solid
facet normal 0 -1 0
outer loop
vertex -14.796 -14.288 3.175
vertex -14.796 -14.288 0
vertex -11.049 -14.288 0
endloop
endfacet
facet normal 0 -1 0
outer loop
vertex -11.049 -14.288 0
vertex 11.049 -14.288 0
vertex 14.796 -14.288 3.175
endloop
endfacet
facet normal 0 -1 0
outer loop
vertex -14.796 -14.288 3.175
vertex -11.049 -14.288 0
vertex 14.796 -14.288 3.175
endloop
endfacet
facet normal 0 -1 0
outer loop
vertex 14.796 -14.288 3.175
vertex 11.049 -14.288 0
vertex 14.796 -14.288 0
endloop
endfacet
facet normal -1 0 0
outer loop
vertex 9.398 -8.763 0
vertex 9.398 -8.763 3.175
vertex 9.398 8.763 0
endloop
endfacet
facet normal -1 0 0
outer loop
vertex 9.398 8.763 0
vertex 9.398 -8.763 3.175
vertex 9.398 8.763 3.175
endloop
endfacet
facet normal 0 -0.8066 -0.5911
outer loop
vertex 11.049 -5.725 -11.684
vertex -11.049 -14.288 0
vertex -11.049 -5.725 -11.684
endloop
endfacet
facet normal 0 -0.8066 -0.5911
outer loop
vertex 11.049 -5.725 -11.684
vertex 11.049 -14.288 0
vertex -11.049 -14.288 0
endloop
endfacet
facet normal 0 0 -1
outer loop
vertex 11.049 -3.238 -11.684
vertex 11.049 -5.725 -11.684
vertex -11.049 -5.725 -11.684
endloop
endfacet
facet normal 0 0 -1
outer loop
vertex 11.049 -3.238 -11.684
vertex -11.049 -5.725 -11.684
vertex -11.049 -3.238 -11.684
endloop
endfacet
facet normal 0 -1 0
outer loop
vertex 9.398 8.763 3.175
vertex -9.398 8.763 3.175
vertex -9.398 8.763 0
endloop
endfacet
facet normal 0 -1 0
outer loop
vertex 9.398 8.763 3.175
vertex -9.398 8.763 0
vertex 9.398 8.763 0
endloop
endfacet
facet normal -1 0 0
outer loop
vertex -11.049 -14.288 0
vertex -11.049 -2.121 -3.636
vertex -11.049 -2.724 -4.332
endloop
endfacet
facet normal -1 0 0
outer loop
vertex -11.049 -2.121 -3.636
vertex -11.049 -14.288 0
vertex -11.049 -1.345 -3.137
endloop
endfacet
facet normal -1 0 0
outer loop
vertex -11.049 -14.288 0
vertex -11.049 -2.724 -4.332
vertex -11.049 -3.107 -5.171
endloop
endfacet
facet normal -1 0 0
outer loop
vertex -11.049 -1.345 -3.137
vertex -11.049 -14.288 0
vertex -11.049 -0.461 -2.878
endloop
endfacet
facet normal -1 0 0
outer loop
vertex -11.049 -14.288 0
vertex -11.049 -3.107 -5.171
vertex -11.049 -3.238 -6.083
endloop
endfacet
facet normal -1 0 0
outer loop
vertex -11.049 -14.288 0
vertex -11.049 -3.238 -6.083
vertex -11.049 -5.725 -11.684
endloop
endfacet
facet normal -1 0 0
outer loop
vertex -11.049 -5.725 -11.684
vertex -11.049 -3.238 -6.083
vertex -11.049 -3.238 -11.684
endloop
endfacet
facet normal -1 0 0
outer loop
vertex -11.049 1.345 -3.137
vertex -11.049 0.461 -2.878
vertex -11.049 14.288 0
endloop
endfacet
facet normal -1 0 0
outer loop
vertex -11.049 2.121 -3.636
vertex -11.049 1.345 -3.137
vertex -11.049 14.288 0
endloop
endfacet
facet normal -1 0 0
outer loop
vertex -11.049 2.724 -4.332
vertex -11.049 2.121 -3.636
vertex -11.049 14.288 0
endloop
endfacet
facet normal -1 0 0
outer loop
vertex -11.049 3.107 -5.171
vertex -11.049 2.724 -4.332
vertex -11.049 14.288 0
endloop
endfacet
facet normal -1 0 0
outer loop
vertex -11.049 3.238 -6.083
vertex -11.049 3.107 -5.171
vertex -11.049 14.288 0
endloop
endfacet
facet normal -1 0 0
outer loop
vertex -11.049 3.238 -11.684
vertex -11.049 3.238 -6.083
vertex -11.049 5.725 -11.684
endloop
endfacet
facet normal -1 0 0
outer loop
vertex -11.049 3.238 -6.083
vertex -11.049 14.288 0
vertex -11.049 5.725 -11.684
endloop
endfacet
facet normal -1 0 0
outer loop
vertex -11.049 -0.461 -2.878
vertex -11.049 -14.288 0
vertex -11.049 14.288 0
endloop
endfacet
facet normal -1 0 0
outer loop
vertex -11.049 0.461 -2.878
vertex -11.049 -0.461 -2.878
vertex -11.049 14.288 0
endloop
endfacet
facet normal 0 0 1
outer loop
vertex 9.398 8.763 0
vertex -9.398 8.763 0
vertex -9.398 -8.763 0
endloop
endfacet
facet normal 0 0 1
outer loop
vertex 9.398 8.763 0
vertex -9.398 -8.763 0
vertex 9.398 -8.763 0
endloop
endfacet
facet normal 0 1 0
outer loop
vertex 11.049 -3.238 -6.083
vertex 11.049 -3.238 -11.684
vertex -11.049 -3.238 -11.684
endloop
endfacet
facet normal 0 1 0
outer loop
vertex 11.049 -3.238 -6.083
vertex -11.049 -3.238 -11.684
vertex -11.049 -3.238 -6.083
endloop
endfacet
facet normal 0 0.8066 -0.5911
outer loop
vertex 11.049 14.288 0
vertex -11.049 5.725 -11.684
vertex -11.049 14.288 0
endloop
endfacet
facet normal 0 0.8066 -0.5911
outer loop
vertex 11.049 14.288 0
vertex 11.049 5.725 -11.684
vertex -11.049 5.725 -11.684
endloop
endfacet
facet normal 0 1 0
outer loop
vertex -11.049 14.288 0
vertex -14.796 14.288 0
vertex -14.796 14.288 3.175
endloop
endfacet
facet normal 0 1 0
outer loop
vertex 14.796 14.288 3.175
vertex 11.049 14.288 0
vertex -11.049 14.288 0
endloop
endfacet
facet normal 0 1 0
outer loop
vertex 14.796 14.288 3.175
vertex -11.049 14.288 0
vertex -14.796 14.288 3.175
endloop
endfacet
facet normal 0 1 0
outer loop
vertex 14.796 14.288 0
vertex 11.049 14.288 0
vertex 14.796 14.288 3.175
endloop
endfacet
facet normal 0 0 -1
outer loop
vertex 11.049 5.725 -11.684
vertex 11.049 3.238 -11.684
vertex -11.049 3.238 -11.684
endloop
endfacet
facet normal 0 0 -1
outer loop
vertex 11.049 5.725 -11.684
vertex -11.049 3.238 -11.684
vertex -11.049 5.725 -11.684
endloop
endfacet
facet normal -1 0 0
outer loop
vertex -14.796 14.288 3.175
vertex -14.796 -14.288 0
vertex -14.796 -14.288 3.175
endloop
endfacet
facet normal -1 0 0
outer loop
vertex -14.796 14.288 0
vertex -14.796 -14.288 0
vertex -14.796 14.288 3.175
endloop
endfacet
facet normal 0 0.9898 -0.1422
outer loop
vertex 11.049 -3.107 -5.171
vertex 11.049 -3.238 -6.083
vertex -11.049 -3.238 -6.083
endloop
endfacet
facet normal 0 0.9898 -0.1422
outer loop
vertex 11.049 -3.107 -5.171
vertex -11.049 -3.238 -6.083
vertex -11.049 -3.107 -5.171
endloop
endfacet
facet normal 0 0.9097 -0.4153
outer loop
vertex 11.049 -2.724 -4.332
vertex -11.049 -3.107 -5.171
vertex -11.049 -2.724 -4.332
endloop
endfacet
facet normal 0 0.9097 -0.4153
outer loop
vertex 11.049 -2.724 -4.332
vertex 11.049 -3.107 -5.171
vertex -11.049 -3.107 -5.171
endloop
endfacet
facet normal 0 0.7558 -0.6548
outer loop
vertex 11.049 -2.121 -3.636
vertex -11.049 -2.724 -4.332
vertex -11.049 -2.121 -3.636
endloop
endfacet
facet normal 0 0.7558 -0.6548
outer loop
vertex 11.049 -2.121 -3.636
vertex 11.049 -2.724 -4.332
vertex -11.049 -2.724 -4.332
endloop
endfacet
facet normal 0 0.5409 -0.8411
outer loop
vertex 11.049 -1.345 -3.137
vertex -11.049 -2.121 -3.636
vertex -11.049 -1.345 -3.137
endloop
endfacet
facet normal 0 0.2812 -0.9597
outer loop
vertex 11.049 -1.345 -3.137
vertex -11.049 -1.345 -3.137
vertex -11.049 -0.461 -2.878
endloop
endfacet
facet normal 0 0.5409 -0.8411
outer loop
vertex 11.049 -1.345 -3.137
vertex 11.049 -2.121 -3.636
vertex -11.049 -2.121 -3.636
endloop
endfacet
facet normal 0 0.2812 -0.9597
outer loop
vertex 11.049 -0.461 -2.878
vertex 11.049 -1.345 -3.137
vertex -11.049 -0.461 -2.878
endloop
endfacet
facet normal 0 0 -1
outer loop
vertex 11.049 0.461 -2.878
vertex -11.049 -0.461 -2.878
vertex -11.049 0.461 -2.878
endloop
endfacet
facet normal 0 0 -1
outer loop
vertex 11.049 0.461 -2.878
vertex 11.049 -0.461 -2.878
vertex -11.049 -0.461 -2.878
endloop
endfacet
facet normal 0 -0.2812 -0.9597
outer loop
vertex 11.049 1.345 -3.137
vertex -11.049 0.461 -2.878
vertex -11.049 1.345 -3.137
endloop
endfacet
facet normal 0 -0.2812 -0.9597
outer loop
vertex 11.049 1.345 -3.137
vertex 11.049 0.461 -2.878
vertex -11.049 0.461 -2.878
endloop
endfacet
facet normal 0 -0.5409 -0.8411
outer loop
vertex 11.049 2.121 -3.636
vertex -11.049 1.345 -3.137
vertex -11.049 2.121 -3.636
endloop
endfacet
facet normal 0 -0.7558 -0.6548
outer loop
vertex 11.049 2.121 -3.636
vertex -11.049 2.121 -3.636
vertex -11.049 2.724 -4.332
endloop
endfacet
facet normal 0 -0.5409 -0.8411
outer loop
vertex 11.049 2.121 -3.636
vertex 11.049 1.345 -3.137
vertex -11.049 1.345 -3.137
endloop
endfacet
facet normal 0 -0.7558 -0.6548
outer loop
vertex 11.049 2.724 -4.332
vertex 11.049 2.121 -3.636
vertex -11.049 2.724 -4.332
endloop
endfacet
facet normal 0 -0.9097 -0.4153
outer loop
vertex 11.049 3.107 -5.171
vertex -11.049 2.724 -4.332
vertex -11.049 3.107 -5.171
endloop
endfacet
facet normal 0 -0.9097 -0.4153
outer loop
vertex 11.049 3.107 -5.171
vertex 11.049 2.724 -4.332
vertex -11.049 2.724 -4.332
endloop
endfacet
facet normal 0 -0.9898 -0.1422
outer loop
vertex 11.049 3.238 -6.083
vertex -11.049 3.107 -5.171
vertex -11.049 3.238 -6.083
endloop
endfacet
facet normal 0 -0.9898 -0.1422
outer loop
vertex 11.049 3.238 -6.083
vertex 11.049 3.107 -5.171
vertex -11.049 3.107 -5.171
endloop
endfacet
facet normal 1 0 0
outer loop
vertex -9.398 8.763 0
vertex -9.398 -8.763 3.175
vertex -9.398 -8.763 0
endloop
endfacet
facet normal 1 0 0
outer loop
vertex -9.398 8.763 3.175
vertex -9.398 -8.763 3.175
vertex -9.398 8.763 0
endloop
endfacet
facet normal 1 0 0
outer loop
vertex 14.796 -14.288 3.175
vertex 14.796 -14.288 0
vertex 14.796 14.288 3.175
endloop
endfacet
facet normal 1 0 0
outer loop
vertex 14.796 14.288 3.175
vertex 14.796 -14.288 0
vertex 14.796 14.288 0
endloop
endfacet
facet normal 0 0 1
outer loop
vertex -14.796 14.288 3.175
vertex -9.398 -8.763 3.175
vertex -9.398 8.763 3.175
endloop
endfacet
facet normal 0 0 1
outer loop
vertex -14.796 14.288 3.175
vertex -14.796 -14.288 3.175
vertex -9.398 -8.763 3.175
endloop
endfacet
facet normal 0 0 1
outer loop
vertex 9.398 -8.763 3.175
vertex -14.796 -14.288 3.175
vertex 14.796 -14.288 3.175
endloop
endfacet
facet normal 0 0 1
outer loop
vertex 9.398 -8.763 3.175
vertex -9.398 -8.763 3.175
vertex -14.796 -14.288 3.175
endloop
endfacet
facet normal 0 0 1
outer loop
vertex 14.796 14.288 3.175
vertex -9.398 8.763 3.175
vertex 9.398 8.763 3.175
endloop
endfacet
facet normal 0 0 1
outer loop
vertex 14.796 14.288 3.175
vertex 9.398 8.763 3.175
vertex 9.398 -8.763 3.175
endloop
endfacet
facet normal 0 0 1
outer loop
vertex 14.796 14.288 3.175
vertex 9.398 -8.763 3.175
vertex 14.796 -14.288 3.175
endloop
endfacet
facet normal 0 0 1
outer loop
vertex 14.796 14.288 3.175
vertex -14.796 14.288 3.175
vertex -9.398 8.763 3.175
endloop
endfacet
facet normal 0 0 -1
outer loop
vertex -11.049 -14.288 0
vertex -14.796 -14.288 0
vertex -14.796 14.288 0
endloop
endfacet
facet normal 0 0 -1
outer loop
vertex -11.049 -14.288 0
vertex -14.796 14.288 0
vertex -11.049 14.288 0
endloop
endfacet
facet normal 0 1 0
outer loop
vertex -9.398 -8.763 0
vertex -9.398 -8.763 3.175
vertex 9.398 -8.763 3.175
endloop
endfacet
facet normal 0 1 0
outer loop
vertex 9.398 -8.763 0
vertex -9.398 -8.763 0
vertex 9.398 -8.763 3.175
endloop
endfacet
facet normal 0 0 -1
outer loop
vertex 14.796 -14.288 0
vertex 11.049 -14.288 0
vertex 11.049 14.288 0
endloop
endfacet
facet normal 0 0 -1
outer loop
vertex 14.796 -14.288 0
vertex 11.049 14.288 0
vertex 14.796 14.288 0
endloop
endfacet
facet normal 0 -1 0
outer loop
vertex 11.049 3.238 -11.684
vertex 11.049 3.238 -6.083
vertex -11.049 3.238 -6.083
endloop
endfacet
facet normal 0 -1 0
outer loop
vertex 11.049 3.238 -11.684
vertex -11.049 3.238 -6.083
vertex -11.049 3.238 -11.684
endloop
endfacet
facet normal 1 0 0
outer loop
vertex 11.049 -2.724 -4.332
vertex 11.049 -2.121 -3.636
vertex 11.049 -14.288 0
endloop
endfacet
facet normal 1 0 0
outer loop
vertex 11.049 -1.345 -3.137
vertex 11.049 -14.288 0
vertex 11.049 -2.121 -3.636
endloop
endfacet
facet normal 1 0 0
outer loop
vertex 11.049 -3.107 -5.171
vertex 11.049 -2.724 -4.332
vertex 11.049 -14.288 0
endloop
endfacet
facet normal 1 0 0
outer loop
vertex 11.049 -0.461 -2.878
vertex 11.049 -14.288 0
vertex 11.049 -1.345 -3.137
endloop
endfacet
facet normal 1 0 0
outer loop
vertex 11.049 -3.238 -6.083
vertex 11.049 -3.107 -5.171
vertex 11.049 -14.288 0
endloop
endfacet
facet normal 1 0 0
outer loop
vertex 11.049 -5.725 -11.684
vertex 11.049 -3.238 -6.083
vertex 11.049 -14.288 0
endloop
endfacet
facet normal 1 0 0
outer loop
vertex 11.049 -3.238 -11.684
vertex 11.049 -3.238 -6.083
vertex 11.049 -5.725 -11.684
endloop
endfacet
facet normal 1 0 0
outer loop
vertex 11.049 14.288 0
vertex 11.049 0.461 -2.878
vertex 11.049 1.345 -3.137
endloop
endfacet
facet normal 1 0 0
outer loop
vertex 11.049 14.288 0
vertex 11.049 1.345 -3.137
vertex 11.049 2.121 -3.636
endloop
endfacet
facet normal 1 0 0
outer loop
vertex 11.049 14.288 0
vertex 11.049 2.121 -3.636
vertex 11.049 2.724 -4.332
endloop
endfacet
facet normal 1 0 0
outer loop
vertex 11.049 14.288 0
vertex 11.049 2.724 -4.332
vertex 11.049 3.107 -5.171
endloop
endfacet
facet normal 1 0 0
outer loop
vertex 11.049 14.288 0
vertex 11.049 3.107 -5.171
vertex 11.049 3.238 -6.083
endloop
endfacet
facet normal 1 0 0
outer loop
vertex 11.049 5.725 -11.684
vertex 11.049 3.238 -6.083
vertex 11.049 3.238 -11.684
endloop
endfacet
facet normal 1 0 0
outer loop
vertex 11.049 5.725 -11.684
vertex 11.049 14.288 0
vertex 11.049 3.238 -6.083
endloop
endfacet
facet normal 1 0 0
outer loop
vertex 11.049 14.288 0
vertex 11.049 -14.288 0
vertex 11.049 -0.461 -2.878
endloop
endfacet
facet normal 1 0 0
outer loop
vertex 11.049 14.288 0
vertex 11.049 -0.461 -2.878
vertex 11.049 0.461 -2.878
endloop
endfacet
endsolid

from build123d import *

# Parameters (mm, degrees)
SKETCH1_W           = 29.591
SKETCH1_H           = 28.575
BOSS_EXTRUDE1_DEPTH = 3.175
BOSS_EXTRUDE2_DEPTH = 11.049
SKETCH3_W           = 18.796
SKETCH3_H           = 17.526
CUT_EXTRUDE1_DEPTH  = 3.175


with BuildPart() as part:
    # Sketch1 → Boss-Extrude1 (new body)
    with BuildSketch(Plane.XY):
        Rectangle(SKETCH1_W, SKETCH1_H)
    extrude(amount=BOSS_EXTRUDE1_DEPTH)

    # Sketch2 → Boss-Extrude2 (add, symmetric)
    with BuildSketch(Plane(origin=(0, 0, 0), x_dir=(0, 0, -1), z_dir=(1, 0, 0))):
        with BuildLine():
            Line((0, -14.2875), (11.684, -5.724576677))
            Line((11.684, -5.724576677), (11.684, -3.2385))
            Line((11.684, -3.2385), (6.0833, -3.2385))
            ThreePointArc((6.0833, -3.2385), (2.8448, 0), (6.0833, 3.2385))
            Line((6.0833, 3.2385), (11.684, 3.2385))
            Line((11.684, 3.2385), (11.684, 5.724576677))
            Line((11.684, 5.724576677), (0, 14.2875))
            Line((0, 14.2875), (0, -14.2875))
        make_face()
    extrude(amount=BOSS_EXTRUDE2_DEPTH, both=True)

    # Sketch3 → Cut-Extrude1 (cut)
    with BuildSketch(Plane.XY.offset(3.175)):
        Rectangle(SKETCH3_W, SKETCH3_H)
    extrude(amount=-CUT_EXTRUDE1_DEPTH, mode=Mode.SUBTRACT)


solid = part.part
